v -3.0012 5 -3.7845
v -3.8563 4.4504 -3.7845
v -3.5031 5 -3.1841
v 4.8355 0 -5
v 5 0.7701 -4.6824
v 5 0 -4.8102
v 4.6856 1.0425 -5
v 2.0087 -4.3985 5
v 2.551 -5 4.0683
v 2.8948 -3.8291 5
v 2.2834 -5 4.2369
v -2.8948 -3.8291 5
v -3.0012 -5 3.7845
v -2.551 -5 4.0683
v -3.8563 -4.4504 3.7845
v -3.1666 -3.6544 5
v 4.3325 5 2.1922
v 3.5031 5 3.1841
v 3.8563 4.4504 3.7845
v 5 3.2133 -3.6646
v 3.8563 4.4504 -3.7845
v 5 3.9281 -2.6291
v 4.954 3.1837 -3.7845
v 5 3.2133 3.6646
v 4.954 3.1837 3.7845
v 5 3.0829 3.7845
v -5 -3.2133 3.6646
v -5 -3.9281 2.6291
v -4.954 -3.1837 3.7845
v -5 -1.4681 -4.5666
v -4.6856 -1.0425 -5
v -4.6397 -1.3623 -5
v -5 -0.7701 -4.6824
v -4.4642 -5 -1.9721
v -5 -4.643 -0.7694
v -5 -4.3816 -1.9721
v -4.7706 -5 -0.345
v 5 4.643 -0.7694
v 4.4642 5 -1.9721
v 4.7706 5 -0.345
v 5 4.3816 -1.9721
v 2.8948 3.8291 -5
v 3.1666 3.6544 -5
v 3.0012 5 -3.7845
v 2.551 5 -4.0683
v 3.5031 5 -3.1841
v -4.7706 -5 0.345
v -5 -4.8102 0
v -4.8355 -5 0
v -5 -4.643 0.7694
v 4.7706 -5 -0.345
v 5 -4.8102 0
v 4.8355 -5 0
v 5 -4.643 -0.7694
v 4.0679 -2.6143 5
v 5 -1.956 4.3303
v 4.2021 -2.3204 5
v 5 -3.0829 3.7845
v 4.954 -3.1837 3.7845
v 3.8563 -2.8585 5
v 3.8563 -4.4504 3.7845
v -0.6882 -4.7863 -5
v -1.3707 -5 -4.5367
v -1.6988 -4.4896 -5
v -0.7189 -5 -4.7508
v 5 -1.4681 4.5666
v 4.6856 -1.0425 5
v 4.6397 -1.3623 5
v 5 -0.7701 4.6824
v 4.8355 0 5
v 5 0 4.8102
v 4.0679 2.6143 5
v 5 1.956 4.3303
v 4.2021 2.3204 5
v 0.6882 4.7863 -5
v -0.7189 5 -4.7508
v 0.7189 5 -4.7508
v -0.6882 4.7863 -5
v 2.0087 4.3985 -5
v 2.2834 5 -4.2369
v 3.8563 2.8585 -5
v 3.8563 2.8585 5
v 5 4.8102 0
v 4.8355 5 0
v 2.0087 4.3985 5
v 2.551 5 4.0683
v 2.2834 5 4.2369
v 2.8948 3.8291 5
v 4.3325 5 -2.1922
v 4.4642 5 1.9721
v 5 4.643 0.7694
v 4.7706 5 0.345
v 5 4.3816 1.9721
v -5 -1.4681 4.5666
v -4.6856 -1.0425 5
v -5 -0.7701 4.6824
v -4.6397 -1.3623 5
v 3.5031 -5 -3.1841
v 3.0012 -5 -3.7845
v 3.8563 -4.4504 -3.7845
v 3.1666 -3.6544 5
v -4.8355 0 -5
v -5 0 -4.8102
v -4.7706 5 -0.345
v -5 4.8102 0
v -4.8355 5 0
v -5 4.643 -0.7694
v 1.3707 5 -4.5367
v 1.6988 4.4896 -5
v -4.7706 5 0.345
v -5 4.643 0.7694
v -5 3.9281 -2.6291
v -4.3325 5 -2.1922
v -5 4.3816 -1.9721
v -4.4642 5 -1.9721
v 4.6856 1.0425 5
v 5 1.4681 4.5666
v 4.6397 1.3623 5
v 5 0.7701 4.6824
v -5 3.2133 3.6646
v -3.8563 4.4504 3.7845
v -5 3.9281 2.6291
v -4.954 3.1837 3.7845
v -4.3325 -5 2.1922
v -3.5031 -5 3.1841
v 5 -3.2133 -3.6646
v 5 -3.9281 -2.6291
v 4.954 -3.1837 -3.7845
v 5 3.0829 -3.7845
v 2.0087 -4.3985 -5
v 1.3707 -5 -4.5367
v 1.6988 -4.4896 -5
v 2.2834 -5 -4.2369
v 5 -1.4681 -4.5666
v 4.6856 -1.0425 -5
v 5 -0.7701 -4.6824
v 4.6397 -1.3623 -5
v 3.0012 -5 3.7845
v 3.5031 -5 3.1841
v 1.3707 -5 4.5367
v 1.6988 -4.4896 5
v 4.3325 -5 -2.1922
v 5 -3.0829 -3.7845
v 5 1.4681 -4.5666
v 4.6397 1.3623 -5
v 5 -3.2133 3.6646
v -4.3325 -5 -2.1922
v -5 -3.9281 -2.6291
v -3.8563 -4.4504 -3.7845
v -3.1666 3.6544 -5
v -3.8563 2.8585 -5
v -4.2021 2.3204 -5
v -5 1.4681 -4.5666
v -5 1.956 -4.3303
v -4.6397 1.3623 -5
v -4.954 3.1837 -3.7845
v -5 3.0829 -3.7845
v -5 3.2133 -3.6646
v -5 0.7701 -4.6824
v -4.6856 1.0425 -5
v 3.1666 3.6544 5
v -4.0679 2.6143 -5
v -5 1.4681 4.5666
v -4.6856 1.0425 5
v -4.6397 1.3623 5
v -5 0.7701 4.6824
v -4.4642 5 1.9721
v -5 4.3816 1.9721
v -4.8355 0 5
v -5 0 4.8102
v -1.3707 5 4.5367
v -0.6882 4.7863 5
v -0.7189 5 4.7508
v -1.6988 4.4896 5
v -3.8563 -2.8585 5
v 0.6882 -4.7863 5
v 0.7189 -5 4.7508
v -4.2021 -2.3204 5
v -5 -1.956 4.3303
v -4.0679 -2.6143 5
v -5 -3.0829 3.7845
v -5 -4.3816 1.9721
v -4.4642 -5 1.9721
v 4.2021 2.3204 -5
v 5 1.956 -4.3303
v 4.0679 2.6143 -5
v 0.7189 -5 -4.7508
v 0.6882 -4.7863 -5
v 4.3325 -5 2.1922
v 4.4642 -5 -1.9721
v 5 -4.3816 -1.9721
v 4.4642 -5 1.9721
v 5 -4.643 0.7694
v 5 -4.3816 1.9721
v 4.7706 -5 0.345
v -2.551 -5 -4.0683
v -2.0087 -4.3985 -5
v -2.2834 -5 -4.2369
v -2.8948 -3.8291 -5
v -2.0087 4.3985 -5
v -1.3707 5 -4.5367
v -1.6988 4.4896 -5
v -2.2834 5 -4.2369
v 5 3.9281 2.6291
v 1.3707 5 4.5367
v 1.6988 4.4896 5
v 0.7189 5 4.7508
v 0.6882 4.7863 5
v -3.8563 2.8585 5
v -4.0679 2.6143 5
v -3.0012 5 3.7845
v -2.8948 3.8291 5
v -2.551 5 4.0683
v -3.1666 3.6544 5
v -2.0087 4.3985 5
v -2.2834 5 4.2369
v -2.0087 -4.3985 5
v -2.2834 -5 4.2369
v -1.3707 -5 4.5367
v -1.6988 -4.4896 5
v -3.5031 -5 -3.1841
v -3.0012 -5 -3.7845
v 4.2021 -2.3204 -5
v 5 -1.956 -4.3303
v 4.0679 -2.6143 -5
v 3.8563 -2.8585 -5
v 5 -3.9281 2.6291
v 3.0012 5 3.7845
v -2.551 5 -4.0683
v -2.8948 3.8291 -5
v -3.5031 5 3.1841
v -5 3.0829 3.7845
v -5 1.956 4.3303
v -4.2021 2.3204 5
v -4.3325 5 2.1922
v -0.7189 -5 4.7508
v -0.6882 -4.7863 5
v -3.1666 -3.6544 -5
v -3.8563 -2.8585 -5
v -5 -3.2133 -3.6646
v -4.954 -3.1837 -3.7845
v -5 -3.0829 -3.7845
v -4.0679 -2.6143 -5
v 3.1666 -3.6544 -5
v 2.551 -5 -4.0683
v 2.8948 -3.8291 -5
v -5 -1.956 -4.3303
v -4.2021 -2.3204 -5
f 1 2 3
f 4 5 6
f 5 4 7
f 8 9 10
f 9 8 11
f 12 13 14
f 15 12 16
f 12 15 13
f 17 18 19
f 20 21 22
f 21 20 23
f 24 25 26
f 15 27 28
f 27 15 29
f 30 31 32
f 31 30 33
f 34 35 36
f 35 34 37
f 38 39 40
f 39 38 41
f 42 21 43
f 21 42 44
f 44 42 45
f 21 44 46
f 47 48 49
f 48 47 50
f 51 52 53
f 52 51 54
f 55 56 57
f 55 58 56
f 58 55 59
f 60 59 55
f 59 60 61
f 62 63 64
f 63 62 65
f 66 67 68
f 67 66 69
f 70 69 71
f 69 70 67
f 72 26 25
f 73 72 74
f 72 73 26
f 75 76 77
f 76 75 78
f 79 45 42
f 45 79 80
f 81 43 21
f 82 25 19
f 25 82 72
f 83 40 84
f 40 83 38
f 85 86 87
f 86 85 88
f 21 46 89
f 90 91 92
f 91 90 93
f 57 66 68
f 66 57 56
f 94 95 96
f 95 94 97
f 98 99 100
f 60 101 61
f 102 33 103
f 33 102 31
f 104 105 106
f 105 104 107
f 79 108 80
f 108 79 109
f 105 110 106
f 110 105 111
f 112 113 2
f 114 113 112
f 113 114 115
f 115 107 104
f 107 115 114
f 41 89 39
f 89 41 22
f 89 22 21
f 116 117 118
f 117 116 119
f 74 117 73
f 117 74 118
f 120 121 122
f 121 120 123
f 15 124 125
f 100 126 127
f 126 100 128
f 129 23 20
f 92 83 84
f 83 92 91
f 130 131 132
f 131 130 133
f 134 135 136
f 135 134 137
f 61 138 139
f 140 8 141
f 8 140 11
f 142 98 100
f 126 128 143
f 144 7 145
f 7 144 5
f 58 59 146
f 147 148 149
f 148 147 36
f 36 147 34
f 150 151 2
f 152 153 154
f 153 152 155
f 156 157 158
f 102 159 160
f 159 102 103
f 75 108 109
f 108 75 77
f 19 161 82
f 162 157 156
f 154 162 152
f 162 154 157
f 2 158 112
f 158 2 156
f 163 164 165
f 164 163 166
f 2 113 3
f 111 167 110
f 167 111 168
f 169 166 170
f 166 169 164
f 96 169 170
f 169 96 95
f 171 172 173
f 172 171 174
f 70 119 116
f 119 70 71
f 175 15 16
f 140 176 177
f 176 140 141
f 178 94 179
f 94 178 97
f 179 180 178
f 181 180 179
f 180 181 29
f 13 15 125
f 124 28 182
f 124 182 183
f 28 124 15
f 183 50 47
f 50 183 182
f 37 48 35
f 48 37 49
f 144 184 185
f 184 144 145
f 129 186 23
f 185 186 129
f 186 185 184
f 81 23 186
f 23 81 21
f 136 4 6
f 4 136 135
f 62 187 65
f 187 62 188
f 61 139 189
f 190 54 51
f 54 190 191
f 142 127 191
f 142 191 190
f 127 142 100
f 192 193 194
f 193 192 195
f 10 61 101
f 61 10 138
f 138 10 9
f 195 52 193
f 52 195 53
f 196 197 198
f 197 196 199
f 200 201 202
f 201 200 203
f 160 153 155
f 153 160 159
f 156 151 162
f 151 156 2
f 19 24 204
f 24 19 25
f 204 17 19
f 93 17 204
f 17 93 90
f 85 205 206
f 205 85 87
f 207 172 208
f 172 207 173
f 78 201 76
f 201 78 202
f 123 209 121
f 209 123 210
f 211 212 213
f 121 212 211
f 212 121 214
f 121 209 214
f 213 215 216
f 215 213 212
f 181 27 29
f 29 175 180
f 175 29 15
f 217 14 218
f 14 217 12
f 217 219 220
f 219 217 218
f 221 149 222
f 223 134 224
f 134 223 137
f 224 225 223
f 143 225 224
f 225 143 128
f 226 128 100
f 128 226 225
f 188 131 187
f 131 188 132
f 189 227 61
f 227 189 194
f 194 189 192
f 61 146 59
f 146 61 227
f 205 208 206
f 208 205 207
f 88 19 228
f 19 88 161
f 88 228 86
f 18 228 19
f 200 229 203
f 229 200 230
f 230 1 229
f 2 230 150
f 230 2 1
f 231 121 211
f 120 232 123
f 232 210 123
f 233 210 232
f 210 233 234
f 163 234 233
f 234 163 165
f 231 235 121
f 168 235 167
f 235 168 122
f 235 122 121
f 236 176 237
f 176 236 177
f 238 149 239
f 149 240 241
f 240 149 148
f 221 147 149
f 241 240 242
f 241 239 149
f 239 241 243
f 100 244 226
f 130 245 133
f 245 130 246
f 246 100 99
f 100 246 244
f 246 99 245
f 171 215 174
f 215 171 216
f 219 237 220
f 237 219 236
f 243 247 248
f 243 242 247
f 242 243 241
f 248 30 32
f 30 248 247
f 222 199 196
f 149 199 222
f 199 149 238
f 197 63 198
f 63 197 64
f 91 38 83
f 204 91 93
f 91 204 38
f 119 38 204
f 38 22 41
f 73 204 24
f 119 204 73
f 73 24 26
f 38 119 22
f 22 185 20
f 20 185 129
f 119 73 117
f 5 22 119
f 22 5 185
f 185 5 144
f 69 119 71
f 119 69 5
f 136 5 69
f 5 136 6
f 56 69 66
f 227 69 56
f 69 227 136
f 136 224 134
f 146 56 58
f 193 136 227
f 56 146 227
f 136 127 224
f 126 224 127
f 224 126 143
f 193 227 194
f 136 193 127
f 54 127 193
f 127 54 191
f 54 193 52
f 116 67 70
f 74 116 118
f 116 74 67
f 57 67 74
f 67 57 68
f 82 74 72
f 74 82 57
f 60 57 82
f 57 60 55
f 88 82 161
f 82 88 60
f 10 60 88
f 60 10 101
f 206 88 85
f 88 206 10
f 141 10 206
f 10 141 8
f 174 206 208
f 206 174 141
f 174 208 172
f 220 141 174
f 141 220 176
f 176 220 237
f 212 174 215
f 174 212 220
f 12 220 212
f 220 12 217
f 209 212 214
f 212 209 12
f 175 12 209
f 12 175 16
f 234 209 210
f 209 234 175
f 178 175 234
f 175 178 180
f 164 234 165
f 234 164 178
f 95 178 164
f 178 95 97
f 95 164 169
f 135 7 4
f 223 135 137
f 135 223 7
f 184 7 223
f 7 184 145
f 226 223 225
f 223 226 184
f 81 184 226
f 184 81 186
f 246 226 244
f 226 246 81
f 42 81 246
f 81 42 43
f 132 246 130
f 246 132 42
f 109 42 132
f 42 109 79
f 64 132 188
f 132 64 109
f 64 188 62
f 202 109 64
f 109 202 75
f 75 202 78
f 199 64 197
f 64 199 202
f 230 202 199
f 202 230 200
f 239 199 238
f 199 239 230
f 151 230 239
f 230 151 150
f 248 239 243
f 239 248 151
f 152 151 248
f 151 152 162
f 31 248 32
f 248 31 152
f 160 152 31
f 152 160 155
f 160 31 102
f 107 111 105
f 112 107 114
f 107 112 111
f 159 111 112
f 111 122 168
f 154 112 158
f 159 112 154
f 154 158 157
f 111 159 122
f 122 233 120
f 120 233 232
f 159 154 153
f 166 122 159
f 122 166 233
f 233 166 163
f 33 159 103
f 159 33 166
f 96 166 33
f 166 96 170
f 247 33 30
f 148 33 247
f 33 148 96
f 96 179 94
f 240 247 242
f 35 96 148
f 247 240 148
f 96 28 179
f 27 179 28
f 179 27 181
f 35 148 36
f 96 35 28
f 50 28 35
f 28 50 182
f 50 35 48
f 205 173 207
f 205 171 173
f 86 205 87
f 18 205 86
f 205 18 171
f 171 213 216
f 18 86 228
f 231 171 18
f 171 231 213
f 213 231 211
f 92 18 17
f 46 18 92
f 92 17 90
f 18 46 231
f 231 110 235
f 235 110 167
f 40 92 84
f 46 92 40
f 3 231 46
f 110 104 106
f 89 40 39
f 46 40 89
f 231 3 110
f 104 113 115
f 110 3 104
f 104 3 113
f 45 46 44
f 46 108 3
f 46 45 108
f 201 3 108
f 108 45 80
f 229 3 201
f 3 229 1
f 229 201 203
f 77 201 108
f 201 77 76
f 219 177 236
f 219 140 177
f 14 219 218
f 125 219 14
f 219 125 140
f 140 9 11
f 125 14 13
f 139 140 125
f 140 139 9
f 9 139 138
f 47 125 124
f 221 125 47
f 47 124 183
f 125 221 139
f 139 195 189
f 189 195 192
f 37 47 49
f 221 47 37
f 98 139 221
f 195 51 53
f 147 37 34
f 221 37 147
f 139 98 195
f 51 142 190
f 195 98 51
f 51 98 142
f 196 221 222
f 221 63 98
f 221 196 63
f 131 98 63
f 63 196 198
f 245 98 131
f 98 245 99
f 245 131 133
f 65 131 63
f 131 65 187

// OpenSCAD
// Sphere clipped to a cube — rounded cube shape
intersection() {
    sphere(r=7);
    cube([10, 10, 10], center=true);
}
